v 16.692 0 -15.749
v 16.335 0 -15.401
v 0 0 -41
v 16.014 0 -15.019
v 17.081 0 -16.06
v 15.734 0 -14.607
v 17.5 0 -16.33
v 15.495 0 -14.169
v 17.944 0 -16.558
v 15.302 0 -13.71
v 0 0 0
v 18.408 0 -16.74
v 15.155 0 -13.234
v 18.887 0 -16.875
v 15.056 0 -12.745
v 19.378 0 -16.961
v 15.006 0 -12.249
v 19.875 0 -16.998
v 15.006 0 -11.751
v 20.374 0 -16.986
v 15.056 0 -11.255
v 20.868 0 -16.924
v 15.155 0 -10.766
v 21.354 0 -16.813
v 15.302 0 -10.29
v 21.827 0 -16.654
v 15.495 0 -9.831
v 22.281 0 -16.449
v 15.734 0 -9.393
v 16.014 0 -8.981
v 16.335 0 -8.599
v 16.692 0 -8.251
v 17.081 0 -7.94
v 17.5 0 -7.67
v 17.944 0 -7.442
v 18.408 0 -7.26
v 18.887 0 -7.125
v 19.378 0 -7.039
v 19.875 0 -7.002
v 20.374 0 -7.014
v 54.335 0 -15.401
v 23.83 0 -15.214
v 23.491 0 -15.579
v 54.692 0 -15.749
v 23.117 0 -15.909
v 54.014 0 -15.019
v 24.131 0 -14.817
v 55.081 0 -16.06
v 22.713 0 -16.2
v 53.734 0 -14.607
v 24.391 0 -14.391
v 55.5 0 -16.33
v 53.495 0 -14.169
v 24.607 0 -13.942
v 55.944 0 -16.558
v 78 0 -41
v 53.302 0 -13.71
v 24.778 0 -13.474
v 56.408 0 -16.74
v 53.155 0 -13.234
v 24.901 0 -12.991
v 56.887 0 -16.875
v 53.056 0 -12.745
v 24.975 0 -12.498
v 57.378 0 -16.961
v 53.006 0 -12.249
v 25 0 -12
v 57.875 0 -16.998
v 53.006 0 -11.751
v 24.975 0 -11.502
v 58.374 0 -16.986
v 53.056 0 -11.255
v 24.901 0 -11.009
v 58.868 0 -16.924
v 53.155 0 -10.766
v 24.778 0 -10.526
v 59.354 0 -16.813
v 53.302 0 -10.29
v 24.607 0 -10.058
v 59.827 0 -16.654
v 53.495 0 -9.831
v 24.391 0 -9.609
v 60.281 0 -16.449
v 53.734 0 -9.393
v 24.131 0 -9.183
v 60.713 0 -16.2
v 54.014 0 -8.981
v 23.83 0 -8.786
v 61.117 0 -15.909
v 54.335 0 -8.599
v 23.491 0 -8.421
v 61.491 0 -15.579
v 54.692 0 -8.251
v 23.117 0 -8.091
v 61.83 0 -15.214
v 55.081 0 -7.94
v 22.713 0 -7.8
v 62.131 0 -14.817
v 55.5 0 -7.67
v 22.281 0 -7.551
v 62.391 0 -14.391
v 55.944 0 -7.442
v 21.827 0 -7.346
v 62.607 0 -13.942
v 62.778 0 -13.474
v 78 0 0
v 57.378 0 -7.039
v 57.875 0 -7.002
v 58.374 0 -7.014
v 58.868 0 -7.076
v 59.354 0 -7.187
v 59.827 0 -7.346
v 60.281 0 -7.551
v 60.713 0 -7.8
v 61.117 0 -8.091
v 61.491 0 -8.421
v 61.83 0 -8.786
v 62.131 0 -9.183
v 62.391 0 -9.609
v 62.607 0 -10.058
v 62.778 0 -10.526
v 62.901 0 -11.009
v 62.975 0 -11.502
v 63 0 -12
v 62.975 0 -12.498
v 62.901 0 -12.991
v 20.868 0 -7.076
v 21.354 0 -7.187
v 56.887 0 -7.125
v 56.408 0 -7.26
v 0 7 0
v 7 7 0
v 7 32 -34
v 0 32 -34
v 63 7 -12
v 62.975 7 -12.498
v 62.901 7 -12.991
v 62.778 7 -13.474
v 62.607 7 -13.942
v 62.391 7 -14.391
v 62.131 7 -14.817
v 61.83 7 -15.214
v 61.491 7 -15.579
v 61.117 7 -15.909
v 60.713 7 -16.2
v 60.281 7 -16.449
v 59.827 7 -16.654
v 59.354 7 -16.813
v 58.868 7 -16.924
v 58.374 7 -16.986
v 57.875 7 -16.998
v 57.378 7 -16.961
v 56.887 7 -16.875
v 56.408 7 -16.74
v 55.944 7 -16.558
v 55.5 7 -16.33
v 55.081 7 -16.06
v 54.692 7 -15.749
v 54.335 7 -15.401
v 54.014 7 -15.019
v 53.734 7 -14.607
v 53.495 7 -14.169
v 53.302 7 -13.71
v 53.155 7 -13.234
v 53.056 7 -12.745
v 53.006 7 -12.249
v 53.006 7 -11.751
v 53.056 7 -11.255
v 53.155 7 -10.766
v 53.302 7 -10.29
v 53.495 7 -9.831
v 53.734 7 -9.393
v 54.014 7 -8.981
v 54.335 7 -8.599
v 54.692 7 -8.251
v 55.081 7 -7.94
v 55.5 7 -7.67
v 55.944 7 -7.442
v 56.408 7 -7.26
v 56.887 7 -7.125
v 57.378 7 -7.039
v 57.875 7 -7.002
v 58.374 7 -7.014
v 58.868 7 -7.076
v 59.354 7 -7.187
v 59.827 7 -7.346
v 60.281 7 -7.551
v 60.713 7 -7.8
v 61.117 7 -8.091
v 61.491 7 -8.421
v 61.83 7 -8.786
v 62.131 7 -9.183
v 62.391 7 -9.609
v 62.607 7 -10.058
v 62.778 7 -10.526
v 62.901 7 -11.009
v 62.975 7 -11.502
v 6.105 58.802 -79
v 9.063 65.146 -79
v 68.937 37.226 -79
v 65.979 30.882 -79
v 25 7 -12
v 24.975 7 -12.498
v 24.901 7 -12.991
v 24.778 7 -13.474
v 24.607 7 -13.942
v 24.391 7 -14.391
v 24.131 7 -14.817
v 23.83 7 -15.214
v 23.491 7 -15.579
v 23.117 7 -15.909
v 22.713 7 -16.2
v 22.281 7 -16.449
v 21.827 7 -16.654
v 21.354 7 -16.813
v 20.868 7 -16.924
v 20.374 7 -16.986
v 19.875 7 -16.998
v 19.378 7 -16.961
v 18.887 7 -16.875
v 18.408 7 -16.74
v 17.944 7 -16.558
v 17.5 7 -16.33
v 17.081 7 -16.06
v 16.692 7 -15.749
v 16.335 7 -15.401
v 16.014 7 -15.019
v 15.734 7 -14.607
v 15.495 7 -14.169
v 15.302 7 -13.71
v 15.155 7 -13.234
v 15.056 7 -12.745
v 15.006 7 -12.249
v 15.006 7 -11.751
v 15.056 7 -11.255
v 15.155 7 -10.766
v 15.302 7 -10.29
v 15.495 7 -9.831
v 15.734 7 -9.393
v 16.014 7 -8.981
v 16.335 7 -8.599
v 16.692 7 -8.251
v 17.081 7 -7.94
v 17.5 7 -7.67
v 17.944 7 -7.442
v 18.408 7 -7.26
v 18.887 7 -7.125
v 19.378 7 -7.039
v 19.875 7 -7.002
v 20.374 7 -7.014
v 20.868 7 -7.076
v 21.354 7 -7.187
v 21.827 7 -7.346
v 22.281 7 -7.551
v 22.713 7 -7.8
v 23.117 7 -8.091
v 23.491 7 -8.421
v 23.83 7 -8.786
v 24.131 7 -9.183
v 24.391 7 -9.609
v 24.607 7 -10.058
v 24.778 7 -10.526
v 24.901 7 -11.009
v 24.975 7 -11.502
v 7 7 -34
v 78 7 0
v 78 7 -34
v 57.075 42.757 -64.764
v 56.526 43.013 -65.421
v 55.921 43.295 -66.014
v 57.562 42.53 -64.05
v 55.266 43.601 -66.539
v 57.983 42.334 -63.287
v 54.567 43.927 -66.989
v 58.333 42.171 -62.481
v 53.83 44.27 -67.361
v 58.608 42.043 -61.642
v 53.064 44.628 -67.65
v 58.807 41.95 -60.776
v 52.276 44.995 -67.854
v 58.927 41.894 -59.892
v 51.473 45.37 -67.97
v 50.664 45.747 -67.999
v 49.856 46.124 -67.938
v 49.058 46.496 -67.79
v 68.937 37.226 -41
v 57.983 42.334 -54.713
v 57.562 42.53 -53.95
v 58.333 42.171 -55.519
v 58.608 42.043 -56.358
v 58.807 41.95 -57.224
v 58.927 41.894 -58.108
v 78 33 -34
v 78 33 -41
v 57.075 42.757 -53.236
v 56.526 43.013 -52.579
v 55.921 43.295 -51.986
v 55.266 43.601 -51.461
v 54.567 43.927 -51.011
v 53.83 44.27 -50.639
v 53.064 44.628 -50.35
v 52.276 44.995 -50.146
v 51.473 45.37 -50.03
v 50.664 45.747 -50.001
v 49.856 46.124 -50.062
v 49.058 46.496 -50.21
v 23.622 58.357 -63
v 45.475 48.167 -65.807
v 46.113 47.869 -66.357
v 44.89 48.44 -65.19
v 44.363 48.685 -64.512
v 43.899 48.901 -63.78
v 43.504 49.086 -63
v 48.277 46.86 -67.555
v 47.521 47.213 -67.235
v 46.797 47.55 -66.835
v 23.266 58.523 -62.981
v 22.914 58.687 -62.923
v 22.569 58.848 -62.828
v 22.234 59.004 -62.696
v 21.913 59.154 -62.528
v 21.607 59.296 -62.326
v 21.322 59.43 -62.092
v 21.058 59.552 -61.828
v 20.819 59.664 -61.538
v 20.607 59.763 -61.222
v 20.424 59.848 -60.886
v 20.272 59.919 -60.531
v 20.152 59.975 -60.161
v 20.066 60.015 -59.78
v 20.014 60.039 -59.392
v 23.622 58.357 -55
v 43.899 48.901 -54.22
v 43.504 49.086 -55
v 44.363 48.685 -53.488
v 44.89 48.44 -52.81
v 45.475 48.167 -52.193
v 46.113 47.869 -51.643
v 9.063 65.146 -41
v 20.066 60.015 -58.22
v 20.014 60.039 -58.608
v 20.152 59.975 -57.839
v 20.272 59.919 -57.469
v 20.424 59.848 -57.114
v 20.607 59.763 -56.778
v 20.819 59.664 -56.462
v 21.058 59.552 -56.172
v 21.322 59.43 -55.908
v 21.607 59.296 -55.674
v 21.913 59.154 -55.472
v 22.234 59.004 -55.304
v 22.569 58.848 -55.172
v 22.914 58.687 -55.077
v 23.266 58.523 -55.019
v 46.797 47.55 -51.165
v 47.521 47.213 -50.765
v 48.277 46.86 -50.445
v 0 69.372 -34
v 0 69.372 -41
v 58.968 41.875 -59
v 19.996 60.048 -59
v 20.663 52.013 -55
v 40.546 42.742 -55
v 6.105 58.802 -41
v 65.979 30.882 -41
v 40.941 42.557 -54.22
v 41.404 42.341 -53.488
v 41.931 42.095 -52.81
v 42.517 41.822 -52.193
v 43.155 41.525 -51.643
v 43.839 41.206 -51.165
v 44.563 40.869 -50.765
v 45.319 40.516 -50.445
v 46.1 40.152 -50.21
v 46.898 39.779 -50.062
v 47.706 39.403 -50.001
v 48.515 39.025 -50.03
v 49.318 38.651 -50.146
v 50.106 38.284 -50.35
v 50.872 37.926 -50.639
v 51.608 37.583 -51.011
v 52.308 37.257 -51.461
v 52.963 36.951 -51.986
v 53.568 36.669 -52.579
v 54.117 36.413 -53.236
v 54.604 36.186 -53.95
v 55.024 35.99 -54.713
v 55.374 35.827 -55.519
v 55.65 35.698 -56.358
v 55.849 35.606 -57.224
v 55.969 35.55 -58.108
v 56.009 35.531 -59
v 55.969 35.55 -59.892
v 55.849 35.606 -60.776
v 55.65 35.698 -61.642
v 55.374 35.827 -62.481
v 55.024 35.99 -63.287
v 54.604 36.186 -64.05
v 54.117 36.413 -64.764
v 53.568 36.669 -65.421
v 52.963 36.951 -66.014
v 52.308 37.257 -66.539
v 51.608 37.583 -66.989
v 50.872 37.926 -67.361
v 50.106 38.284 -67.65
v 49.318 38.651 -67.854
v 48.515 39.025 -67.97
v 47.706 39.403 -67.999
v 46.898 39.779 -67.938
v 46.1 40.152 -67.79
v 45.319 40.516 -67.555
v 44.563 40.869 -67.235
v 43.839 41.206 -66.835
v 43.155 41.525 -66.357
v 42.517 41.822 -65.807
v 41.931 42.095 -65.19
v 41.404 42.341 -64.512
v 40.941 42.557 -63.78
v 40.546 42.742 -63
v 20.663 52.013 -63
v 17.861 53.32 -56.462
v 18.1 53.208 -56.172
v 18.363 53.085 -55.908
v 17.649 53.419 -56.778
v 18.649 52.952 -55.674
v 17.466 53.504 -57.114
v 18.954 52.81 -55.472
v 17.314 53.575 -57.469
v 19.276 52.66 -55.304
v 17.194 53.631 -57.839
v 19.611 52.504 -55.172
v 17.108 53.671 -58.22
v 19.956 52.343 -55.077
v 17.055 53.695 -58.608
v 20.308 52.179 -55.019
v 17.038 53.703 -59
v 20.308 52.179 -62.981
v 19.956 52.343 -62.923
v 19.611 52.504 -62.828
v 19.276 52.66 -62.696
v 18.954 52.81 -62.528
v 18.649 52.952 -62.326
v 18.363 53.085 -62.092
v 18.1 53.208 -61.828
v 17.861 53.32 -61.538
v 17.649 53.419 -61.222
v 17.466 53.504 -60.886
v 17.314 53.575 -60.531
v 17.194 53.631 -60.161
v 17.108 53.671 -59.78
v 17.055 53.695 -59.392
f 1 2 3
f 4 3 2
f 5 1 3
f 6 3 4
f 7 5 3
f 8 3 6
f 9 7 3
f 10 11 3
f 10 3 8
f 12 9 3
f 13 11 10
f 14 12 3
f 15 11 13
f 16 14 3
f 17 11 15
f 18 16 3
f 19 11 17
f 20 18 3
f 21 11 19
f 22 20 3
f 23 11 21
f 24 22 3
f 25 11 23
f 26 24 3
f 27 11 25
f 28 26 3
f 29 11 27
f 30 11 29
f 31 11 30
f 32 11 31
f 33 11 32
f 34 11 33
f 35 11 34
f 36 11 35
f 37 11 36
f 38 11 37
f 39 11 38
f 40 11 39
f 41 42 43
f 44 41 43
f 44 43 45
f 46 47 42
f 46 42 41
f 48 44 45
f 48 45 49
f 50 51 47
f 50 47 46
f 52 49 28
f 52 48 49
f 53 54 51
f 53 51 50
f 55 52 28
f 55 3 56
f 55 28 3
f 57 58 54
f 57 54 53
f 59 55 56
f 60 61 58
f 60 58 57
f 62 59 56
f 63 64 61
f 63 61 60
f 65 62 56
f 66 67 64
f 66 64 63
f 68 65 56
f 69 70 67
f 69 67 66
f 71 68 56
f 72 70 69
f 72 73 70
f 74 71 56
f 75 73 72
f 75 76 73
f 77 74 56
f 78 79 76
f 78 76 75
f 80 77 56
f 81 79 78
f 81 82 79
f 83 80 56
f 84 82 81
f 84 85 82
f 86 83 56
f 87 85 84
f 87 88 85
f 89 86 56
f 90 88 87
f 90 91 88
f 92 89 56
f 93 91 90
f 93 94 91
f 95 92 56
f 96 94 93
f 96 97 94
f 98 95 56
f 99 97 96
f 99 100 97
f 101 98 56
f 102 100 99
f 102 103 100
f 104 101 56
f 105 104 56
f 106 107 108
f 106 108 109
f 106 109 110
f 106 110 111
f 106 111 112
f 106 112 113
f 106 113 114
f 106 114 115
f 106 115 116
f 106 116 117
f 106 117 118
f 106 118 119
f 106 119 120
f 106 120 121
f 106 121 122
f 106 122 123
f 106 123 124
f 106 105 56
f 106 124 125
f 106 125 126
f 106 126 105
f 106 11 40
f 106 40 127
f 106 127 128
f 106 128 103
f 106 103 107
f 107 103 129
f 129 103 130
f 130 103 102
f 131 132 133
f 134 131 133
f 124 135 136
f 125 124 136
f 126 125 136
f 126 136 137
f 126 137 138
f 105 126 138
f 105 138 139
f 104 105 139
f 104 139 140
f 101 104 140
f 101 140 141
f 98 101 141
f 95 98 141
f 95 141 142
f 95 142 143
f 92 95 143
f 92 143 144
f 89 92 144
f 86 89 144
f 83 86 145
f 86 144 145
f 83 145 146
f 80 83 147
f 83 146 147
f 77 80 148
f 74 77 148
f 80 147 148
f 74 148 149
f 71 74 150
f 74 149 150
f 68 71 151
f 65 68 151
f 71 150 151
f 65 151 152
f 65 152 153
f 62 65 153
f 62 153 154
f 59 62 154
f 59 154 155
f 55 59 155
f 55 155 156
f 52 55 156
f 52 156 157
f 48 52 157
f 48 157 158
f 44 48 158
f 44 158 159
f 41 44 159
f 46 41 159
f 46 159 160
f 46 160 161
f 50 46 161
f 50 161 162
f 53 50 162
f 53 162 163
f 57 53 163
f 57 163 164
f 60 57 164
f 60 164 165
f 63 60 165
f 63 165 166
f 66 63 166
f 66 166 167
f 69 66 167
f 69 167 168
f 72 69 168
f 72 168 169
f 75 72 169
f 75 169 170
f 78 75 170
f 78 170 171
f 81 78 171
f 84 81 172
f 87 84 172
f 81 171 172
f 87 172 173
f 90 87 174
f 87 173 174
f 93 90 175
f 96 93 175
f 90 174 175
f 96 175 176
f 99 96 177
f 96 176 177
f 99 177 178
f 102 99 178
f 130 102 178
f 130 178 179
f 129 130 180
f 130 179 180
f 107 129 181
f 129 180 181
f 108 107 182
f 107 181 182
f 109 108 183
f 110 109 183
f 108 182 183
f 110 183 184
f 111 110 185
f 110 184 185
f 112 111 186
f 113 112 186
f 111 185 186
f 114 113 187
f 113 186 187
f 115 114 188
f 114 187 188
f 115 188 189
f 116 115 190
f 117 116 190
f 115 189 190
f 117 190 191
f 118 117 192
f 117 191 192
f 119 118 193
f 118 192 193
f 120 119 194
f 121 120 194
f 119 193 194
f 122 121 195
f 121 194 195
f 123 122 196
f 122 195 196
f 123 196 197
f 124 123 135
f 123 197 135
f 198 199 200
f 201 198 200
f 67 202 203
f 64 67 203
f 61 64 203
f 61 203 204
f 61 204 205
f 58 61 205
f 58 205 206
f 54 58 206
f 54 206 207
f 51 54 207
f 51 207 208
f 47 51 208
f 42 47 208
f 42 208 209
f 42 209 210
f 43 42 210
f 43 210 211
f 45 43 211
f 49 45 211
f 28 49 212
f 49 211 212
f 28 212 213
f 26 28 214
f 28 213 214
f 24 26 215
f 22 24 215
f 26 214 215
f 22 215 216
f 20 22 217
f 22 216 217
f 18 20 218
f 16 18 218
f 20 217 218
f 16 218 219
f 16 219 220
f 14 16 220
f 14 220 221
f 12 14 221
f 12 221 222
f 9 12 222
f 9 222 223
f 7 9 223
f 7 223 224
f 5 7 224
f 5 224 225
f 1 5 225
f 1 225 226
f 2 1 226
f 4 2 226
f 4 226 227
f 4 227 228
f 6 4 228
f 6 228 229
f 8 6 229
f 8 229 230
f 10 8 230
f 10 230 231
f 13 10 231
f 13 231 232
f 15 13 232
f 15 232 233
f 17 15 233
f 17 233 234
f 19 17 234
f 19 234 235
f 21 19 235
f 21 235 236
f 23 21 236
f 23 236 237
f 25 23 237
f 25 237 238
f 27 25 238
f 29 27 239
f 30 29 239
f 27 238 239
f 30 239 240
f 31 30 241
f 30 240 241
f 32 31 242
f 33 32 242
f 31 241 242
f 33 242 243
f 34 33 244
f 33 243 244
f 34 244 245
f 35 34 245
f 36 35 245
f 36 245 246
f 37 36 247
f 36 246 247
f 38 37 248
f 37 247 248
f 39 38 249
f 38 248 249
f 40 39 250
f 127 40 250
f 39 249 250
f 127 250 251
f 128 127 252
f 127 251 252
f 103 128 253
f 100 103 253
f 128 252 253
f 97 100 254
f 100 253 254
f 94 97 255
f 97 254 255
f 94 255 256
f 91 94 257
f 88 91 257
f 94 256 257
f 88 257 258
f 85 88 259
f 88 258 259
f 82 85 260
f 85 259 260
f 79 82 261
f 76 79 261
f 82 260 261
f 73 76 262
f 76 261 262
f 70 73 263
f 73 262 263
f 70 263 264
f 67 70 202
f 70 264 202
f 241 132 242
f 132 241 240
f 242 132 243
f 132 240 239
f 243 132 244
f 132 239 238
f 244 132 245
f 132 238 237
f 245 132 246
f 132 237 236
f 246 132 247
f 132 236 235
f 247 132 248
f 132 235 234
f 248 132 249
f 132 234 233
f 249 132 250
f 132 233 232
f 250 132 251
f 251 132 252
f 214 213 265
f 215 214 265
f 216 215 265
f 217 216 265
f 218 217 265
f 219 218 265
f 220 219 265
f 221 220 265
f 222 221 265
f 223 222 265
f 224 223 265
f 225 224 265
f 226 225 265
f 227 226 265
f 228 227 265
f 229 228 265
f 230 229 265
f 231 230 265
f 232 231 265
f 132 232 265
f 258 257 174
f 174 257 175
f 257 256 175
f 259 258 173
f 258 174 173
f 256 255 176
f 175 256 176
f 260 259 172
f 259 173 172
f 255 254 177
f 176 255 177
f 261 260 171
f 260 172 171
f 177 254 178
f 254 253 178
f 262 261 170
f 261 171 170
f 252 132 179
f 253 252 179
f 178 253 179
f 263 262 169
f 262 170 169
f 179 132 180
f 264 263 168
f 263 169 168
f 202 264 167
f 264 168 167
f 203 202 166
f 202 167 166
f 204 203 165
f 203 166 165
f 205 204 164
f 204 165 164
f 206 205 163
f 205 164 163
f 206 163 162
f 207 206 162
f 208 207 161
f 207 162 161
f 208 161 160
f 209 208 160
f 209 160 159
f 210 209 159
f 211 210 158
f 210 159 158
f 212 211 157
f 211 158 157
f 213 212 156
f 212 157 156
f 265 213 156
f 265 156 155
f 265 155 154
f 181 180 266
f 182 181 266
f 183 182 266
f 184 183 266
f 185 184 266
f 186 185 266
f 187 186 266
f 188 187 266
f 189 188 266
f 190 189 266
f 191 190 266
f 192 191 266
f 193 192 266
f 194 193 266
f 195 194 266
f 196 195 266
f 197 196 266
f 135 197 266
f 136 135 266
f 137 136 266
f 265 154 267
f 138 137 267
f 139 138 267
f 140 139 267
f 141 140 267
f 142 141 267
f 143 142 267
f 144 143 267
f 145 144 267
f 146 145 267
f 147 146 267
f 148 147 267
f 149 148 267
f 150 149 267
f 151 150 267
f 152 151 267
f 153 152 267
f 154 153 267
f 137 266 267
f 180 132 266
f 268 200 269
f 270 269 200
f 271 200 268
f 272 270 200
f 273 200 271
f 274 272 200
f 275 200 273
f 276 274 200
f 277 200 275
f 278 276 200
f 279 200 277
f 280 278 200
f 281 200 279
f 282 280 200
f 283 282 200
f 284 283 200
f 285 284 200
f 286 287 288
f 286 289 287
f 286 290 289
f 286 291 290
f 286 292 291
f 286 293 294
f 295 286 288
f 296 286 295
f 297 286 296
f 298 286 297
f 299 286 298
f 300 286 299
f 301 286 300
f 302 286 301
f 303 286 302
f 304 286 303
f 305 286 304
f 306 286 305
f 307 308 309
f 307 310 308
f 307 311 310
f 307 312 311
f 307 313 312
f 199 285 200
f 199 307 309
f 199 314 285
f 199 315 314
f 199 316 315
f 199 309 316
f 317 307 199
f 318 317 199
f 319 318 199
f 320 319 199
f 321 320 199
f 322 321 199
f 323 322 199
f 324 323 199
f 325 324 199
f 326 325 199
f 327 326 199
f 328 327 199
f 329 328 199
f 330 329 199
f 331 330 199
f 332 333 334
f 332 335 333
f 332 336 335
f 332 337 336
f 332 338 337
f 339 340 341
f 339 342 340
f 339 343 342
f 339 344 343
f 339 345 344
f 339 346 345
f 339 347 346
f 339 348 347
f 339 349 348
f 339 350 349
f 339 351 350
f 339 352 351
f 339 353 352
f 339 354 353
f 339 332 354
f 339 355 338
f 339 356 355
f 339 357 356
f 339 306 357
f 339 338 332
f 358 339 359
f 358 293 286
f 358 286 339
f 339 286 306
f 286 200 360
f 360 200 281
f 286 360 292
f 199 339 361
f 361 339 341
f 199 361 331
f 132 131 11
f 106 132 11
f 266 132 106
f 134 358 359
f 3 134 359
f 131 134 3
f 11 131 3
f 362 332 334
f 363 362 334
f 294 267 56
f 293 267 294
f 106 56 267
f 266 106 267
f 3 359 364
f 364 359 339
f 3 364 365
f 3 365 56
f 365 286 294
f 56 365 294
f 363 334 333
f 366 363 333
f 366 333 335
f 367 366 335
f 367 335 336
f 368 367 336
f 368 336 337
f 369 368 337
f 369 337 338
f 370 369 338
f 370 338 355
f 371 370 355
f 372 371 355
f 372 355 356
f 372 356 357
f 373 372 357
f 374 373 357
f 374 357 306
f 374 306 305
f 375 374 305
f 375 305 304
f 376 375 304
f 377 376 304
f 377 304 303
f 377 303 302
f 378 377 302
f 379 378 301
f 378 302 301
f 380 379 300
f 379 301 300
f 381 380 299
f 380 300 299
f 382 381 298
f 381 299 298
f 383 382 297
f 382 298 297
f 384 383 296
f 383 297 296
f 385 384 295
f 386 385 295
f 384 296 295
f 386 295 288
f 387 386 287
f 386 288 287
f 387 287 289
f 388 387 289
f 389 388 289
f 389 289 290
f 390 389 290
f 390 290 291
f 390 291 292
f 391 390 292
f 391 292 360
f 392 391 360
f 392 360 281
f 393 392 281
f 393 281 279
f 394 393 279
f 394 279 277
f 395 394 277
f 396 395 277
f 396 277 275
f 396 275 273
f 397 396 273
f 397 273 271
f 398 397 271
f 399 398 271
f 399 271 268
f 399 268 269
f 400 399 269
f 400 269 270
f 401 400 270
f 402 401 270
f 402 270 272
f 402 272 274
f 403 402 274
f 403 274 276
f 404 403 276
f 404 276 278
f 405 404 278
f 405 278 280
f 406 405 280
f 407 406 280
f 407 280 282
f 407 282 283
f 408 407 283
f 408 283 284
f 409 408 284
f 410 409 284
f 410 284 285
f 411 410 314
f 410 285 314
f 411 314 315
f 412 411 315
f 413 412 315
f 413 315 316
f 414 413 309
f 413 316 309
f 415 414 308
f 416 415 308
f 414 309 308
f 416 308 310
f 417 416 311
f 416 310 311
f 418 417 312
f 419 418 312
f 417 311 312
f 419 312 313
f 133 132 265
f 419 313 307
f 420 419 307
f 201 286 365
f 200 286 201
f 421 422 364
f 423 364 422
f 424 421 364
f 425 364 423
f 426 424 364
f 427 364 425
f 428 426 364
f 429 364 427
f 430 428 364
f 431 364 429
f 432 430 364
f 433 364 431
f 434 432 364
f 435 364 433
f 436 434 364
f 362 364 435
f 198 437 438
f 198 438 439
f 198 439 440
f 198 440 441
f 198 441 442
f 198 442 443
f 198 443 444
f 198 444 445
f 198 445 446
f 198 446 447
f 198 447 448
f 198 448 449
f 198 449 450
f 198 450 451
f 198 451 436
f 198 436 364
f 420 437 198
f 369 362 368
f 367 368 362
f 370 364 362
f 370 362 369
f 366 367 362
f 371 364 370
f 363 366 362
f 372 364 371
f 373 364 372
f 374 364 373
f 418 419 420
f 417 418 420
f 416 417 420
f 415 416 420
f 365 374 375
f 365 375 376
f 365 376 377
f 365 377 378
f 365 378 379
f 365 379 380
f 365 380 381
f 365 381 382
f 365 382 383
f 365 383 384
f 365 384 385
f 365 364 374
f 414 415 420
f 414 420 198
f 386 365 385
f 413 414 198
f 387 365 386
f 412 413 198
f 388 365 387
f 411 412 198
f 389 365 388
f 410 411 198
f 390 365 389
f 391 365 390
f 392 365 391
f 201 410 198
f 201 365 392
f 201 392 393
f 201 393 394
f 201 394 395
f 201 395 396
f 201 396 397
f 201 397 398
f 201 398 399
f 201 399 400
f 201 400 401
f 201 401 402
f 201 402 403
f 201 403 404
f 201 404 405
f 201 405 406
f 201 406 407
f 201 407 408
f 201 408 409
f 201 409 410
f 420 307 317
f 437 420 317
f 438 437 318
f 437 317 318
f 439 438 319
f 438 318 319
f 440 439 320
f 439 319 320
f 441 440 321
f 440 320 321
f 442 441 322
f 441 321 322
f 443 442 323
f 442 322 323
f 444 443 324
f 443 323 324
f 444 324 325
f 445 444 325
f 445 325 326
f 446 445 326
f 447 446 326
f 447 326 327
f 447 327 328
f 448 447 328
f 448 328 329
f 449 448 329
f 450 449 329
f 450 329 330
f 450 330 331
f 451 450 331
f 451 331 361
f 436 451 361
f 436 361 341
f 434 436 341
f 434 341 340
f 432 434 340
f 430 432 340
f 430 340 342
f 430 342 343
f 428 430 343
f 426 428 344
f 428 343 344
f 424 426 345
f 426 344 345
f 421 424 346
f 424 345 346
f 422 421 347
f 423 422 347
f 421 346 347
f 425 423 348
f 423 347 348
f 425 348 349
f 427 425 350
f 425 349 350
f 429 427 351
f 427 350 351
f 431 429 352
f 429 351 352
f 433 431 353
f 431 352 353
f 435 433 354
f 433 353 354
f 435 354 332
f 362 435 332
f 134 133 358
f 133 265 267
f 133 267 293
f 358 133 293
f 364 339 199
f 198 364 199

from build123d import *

# Parameters (mm, degrees)
BOSS_EXTRUDE1_DEPTH = 79
SKETCH2_W           = 34
SKETCH2_H           = 36.371997336
CUT_EXTRUDE1_DEPTH  = 71
SKETCH2_4_W         = 34
SKETCH2_4_H         = 36.371997336
CUT_EXTRUDE2_DEPTH  = 79
SKETCH3_W           = 10
SKETCH3_H           = 38
SKETCH3_W_2         = 41.460526603
CUT_EXTRUDE3_DEPTH  = 63.872381388
SKETCH4_W           = 38
SKETCH4_H           = 64.41245134
CUT_EXTRUDE4_DEPTH  = 77.063477679
SKETCH5_R           = 5
CUT_EXTRUDE5_DEPTH  = 8


with BuildPart() as part:
    # Sketch1 → Boss-Extrude1 (new body)
    with BuildSketch(Plane.XY):
        Polygon((78, 33), (0, 69.371997336), (0, 0), (78, 0), align=None)
    extrude(amount=-BOSS_EXTRUDE1_DEPTH)

    # Sketch2 → Cut-Extrude1 (cut)
    with BuildSketch(Plane(origin=(78, 0, 0), x_dir=(0, 0, -1), z_dir=(1, 0, 0))):
        Polygon((0, 33), (0, 7), (34, 32), (34, 33), align=None)
        with Locations((17, 51.185998668)):
            Rectangle(SKETCH2_W, SKETCH2_H)
        Polygon((34, 32), (0, 7), (34, 7), align=None)
    extrude(amount=-CUT_EXTRUDE1_DEPTH, mode=Mode.SUBTRACT)

    # Sketch2<4> → Cut-Extrude2 (cut, through all)
    with BuildSketch(Plane(origin=(78, 0, 0), x_dir=(0, 0, -1), z_dir=(1, 0, 0))):
        with Locations((17, 51.185998668)):
            Rectangle(SKETCH2_4_W, SKETCH2_4_H)
        Polygon((0, 33), (0, 7), (34, 32), (34, 33), align=None)
    extrude(amount=-CUT_EXTRUDE2_DEPTH, mode=Mode.SUBTRACT)

    # Sketch3 → Cut-Extrude3 (cut, through all)
    with BuildSketch(Plane(origin=(26.571016534, 56.981728841, 0), x_dir=(0.906307787, -0.422618262, 0), z_dir=(0.422618262, 0.906307787, 0))):
        with Locations((-24.317872928, 60)):
            Rectangle(SKETCH3_W, SKETCH3_H)
        with Locations((77.475868053, 60)):
            Rectangle(SKETCH3_W_2, SKETCH3_H)
        with Locations((51.745604751, 60)):
            Rectangle(SKETCH3_W, SKETCH3_H)
        with BuildLine():
            ThreePointArc((-3.254395249, 63), (-7.254395249, 59), (-3.254395249, 55))
            Line((-3.254395249, 55), (18.683347003, 55))
            ThreePointArc((18.683347003, 55), (35.745604751, 59), (18.683347003, 63))
            Line((18.683347003, 63), (-3.254395249, 63))
        make_face()
    extrude(amount=-CUT_EXTRUDE3_DEPTH, mode=Mode.SUBTRACT)

    # Sketch4 → Cut-Extrude4 (cut, through all)
    with BuildSketch(Plane(origin=(42.365905596, -19.755546224, 0), x_dir=(0, 0, -1), z_dir=(0.906307787, -0.422618262, 0))):
        with Locations((60, 23.666155718)):
            Rectangle(SKETCH4_W, SKETCH4_H)
    extrude(amount=-CUT_EXTRUDE4_DEPTH, mode=Mode.SUBTRACT)

    # Sketch5 → Cut-Extrude5 (cut, through all)
    with BuildSketch(Plane(origin=(0, 7, 0), x_dir=(1, 0, 0), z_dir=(0, 1, 0))):
        with Locations((20, 12)):
            Circle(SKETCH5_R)
        with Locations((58, 12)):
            Circle(SKETCH5_R)
    extrude(amount=-CUT_EXTRUDE5_DEPTH, mode=Mode.SUBTRACT)


solid = part.part
